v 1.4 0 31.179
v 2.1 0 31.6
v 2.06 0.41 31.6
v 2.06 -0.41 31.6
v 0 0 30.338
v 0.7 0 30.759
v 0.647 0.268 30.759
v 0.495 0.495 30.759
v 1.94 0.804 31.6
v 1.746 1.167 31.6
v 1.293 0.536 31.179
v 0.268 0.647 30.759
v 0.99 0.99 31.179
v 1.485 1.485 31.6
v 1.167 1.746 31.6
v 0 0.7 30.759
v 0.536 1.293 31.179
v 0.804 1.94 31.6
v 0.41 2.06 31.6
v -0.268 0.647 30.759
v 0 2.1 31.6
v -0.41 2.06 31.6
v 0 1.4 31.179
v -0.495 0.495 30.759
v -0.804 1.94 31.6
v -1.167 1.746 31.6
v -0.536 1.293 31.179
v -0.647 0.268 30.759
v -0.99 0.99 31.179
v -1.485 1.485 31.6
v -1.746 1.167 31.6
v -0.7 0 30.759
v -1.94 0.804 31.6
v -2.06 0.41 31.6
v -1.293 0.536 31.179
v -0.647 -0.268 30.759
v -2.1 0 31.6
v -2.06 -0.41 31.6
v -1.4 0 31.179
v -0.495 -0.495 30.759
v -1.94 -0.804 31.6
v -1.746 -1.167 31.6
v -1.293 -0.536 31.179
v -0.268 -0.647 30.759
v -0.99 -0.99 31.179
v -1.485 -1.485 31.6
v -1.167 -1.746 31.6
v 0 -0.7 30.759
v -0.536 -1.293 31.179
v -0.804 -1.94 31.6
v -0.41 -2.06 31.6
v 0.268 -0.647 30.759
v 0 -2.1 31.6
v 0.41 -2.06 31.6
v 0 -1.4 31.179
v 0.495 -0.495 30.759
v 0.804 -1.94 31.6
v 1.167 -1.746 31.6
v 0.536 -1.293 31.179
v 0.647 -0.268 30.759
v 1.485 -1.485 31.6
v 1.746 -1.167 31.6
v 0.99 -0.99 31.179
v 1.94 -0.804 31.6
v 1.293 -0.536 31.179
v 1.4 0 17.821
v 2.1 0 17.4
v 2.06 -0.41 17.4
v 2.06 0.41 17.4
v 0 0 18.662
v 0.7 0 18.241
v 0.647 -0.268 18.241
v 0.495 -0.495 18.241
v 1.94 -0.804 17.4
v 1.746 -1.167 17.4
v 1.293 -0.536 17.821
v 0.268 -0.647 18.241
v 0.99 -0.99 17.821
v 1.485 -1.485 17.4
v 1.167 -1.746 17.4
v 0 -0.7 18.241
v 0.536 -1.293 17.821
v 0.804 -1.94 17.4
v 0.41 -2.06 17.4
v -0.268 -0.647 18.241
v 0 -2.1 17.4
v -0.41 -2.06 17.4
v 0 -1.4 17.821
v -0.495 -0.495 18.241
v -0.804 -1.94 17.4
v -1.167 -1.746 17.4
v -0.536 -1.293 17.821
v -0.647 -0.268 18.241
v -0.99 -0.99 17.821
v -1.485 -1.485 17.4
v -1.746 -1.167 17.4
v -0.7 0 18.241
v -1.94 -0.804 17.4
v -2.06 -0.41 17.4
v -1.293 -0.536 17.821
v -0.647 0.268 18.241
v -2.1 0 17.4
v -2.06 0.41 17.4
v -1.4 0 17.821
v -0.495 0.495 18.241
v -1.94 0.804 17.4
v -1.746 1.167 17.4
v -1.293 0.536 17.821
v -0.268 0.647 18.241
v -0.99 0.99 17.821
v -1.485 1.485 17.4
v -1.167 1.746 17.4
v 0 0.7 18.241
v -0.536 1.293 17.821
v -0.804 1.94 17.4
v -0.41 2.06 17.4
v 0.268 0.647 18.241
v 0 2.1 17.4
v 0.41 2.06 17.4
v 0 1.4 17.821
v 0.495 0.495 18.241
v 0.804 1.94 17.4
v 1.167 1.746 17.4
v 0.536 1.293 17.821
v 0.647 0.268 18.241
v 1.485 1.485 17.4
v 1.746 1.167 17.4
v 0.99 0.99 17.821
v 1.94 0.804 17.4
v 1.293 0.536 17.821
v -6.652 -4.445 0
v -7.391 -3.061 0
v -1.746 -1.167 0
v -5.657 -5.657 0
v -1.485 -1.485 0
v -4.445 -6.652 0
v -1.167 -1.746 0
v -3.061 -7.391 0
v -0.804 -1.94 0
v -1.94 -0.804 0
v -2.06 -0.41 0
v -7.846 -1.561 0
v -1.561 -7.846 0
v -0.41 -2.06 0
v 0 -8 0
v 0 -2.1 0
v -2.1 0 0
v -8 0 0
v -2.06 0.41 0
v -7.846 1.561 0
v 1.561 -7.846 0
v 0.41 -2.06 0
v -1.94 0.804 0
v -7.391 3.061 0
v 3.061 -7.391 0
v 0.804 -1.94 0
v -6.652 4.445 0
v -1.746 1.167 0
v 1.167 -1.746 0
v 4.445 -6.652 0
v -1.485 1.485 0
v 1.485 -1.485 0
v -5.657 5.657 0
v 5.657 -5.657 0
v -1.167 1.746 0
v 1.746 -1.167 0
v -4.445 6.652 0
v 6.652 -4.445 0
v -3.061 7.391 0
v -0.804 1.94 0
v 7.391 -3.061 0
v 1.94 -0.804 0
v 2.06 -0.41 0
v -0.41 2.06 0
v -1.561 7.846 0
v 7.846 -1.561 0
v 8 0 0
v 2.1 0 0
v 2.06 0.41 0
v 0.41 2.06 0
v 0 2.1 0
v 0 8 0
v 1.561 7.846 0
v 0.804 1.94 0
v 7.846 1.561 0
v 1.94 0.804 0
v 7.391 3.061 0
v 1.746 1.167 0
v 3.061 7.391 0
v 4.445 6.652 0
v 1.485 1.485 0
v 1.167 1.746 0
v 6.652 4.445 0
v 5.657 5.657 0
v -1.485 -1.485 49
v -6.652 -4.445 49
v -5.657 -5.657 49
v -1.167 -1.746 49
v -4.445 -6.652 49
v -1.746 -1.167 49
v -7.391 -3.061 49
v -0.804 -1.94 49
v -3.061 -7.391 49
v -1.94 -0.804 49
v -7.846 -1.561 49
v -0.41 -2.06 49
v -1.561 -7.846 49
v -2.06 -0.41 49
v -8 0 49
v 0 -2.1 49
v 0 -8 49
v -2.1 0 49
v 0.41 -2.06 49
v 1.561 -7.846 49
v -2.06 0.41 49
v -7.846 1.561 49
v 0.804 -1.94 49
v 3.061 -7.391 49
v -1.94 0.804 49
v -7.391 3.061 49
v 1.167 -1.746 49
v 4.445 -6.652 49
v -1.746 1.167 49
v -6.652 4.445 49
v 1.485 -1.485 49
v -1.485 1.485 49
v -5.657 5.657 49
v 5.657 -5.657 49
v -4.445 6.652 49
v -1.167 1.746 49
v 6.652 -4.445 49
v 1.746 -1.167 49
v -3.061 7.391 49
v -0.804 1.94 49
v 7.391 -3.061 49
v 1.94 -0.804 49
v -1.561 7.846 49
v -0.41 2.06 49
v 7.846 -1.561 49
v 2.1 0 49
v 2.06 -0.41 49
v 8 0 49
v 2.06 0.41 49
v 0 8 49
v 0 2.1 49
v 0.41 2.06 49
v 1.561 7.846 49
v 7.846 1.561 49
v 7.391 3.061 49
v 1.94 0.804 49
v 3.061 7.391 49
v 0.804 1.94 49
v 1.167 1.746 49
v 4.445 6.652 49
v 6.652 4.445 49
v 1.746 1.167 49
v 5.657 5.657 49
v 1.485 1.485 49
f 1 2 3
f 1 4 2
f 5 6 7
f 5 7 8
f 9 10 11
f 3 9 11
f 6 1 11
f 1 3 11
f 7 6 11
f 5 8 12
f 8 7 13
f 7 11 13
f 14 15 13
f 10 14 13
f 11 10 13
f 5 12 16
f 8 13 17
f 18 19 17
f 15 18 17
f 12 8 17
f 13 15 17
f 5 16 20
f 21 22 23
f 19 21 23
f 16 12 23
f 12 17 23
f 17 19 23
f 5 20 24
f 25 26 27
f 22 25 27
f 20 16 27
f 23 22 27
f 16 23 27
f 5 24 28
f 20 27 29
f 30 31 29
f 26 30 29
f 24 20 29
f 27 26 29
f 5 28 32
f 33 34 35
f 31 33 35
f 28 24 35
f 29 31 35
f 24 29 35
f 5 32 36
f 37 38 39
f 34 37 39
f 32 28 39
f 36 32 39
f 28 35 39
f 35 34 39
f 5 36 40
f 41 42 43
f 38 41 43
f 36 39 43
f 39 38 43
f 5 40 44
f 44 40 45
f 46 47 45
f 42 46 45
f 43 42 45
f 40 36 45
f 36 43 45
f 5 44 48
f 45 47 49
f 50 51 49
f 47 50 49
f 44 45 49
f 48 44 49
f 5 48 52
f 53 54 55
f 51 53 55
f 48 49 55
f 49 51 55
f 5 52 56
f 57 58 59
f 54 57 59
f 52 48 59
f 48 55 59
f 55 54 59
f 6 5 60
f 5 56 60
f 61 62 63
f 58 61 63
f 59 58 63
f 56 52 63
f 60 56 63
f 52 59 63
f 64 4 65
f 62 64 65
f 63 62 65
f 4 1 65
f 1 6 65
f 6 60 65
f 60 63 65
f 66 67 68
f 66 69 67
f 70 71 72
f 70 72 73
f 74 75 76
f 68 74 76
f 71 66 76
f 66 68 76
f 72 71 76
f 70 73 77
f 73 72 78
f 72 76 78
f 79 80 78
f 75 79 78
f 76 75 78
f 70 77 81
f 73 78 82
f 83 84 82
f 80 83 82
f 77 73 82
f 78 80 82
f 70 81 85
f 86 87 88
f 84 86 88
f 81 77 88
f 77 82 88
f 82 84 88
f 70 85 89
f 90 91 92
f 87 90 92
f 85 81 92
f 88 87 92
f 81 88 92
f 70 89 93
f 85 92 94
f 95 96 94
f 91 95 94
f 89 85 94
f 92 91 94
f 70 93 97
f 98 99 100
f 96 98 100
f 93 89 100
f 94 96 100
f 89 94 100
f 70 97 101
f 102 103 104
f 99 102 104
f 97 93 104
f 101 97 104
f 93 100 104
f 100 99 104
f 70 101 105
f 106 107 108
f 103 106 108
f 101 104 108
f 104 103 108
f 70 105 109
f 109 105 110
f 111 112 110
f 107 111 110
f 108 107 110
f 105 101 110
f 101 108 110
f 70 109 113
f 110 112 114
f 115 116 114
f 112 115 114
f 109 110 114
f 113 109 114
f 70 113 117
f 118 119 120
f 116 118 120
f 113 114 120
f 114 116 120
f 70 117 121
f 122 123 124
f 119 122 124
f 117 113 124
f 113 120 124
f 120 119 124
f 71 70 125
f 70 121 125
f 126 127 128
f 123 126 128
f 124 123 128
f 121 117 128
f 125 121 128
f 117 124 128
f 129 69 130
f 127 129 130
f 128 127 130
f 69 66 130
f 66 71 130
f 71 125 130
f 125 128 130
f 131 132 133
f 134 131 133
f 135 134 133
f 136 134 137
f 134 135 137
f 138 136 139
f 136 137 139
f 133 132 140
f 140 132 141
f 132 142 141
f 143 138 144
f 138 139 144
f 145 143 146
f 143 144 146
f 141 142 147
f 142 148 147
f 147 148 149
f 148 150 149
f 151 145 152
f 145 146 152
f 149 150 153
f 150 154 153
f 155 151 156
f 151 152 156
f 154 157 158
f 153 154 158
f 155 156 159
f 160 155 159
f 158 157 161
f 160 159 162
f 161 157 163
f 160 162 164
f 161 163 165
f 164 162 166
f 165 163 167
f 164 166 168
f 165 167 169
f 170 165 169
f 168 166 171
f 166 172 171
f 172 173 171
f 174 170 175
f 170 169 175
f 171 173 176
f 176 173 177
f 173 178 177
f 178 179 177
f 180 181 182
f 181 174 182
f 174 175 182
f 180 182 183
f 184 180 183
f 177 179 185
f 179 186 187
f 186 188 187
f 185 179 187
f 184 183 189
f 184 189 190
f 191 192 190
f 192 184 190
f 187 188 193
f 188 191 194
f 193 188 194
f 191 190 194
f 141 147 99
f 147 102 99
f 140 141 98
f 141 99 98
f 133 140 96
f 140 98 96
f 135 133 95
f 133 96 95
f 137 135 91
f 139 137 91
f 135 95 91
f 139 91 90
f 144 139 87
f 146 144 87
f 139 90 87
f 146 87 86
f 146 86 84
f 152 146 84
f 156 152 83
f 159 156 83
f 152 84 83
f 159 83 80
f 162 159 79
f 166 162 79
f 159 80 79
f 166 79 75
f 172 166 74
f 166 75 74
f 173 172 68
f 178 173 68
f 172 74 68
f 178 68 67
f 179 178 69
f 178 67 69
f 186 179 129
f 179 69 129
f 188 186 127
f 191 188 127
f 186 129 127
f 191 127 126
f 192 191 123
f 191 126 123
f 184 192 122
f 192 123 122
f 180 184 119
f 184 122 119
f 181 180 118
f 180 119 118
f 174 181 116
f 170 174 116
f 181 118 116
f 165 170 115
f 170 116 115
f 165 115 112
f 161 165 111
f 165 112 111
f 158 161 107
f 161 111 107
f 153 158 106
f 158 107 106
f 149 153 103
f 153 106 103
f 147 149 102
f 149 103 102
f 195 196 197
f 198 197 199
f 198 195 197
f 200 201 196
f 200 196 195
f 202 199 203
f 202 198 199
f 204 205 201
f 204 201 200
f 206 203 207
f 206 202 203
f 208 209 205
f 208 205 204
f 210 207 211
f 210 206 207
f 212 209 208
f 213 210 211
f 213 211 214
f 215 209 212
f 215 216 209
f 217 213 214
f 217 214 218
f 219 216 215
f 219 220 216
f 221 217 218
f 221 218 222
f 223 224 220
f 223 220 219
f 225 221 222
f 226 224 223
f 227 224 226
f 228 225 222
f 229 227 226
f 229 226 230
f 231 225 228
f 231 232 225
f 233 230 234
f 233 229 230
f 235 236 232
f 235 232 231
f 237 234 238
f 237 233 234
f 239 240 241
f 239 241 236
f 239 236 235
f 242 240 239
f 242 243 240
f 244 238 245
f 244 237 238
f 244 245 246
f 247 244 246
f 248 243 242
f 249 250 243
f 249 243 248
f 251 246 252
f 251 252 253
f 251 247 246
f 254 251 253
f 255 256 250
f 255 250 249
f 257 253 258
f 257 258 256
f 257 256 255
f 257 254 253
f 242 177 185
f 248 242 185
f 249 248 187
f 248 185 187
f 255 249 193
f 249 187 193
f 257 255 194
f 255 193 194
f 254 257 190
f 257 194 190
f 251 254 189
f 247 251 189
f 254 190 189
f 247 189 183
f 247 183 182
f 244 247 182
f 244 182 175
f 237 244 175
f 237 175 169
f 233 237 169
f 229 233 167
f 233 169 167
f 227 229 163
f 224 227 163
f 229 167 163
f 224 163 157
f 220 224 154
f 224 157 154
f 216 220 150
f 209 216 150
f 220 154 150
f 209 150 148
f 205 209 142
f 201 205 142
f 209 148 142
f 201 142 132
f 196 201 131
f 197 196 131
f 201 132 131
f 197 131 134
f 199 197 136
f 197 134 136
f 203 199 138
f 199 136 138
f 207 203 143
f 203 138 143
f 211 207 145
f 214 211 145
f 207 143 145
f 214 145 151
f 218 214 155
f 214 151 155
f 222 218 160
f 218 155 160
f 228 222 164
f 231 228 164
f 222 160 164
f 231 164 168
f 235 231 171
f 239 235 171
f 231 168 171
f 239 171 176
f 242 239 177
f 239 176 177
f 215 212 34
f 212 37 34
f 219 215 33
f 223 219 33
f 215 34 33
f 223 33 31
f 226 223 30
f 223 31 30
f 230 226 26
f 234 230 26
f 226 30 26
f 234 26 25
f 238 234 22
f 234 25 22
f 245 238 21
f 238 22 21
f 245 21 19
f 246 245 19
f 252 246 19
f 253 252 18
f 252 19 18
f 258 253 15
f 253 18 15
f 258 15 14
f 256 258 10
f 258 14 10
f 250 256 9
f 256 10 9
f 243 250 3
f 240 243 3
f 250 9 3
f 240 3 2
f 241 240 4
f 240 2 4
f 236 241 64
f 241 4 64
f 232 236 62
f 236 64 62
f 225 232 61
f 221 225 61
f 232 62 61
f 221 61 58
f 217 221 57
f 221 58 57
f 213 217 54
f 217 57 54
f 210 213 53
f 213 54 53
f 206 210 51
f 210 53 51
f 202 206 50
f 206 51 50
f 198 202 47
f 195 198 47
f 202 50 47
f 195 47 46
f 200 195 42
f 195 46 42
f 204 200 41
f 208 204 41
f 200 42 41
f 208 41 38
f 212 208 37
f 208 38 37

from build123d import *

# Parameters (mm, degrees)
F0_R     = 8
F1_DEPTH = 49
F3_D     = 4.2
F3_DEPTH = 17.4
F3_TIP   = 1.2618073
F5_D     = 4.2
F5_DEPTH = 17.4
F5_TIP   = 1.2618073


with BuildPart() as f1:
    # F0 (on Top) → F1 (new body)
    with BuildSketch(Plane.XY):
        Circle(F0_R)
    extrude(amount=F1_DEPTH)

    # F3
    with Locations(Plane.XY.offset(49)):
        with Locations((0, 0)):
            Hole(F3_D / 2, depth=F3_DEPTH)
            with Locations((0, 0, -(F3_DEPTH + F3_TIP / 2))):  # 118° drill point
                Cone(0, F3_D / 2, F3_TIP, mode=Mode.SUBTRACT)

    # F5
    with Locations(Plane(origin=(0, 0, 0), x_dir=(1, 0, 0), z_dir=(0, 0, -1))):
        with Locations((0, 0)):
            Hole(F5_D / 2, depth=F5_DEPTH)
            with Locations((0, 0, -(F5_DEPTH + F5_TIP / 2))):  # 118° drill point
                Cone(0, F5_D / 2, F5_TIP, mode=Mode.SUBTRACT)


solid = f1.part
